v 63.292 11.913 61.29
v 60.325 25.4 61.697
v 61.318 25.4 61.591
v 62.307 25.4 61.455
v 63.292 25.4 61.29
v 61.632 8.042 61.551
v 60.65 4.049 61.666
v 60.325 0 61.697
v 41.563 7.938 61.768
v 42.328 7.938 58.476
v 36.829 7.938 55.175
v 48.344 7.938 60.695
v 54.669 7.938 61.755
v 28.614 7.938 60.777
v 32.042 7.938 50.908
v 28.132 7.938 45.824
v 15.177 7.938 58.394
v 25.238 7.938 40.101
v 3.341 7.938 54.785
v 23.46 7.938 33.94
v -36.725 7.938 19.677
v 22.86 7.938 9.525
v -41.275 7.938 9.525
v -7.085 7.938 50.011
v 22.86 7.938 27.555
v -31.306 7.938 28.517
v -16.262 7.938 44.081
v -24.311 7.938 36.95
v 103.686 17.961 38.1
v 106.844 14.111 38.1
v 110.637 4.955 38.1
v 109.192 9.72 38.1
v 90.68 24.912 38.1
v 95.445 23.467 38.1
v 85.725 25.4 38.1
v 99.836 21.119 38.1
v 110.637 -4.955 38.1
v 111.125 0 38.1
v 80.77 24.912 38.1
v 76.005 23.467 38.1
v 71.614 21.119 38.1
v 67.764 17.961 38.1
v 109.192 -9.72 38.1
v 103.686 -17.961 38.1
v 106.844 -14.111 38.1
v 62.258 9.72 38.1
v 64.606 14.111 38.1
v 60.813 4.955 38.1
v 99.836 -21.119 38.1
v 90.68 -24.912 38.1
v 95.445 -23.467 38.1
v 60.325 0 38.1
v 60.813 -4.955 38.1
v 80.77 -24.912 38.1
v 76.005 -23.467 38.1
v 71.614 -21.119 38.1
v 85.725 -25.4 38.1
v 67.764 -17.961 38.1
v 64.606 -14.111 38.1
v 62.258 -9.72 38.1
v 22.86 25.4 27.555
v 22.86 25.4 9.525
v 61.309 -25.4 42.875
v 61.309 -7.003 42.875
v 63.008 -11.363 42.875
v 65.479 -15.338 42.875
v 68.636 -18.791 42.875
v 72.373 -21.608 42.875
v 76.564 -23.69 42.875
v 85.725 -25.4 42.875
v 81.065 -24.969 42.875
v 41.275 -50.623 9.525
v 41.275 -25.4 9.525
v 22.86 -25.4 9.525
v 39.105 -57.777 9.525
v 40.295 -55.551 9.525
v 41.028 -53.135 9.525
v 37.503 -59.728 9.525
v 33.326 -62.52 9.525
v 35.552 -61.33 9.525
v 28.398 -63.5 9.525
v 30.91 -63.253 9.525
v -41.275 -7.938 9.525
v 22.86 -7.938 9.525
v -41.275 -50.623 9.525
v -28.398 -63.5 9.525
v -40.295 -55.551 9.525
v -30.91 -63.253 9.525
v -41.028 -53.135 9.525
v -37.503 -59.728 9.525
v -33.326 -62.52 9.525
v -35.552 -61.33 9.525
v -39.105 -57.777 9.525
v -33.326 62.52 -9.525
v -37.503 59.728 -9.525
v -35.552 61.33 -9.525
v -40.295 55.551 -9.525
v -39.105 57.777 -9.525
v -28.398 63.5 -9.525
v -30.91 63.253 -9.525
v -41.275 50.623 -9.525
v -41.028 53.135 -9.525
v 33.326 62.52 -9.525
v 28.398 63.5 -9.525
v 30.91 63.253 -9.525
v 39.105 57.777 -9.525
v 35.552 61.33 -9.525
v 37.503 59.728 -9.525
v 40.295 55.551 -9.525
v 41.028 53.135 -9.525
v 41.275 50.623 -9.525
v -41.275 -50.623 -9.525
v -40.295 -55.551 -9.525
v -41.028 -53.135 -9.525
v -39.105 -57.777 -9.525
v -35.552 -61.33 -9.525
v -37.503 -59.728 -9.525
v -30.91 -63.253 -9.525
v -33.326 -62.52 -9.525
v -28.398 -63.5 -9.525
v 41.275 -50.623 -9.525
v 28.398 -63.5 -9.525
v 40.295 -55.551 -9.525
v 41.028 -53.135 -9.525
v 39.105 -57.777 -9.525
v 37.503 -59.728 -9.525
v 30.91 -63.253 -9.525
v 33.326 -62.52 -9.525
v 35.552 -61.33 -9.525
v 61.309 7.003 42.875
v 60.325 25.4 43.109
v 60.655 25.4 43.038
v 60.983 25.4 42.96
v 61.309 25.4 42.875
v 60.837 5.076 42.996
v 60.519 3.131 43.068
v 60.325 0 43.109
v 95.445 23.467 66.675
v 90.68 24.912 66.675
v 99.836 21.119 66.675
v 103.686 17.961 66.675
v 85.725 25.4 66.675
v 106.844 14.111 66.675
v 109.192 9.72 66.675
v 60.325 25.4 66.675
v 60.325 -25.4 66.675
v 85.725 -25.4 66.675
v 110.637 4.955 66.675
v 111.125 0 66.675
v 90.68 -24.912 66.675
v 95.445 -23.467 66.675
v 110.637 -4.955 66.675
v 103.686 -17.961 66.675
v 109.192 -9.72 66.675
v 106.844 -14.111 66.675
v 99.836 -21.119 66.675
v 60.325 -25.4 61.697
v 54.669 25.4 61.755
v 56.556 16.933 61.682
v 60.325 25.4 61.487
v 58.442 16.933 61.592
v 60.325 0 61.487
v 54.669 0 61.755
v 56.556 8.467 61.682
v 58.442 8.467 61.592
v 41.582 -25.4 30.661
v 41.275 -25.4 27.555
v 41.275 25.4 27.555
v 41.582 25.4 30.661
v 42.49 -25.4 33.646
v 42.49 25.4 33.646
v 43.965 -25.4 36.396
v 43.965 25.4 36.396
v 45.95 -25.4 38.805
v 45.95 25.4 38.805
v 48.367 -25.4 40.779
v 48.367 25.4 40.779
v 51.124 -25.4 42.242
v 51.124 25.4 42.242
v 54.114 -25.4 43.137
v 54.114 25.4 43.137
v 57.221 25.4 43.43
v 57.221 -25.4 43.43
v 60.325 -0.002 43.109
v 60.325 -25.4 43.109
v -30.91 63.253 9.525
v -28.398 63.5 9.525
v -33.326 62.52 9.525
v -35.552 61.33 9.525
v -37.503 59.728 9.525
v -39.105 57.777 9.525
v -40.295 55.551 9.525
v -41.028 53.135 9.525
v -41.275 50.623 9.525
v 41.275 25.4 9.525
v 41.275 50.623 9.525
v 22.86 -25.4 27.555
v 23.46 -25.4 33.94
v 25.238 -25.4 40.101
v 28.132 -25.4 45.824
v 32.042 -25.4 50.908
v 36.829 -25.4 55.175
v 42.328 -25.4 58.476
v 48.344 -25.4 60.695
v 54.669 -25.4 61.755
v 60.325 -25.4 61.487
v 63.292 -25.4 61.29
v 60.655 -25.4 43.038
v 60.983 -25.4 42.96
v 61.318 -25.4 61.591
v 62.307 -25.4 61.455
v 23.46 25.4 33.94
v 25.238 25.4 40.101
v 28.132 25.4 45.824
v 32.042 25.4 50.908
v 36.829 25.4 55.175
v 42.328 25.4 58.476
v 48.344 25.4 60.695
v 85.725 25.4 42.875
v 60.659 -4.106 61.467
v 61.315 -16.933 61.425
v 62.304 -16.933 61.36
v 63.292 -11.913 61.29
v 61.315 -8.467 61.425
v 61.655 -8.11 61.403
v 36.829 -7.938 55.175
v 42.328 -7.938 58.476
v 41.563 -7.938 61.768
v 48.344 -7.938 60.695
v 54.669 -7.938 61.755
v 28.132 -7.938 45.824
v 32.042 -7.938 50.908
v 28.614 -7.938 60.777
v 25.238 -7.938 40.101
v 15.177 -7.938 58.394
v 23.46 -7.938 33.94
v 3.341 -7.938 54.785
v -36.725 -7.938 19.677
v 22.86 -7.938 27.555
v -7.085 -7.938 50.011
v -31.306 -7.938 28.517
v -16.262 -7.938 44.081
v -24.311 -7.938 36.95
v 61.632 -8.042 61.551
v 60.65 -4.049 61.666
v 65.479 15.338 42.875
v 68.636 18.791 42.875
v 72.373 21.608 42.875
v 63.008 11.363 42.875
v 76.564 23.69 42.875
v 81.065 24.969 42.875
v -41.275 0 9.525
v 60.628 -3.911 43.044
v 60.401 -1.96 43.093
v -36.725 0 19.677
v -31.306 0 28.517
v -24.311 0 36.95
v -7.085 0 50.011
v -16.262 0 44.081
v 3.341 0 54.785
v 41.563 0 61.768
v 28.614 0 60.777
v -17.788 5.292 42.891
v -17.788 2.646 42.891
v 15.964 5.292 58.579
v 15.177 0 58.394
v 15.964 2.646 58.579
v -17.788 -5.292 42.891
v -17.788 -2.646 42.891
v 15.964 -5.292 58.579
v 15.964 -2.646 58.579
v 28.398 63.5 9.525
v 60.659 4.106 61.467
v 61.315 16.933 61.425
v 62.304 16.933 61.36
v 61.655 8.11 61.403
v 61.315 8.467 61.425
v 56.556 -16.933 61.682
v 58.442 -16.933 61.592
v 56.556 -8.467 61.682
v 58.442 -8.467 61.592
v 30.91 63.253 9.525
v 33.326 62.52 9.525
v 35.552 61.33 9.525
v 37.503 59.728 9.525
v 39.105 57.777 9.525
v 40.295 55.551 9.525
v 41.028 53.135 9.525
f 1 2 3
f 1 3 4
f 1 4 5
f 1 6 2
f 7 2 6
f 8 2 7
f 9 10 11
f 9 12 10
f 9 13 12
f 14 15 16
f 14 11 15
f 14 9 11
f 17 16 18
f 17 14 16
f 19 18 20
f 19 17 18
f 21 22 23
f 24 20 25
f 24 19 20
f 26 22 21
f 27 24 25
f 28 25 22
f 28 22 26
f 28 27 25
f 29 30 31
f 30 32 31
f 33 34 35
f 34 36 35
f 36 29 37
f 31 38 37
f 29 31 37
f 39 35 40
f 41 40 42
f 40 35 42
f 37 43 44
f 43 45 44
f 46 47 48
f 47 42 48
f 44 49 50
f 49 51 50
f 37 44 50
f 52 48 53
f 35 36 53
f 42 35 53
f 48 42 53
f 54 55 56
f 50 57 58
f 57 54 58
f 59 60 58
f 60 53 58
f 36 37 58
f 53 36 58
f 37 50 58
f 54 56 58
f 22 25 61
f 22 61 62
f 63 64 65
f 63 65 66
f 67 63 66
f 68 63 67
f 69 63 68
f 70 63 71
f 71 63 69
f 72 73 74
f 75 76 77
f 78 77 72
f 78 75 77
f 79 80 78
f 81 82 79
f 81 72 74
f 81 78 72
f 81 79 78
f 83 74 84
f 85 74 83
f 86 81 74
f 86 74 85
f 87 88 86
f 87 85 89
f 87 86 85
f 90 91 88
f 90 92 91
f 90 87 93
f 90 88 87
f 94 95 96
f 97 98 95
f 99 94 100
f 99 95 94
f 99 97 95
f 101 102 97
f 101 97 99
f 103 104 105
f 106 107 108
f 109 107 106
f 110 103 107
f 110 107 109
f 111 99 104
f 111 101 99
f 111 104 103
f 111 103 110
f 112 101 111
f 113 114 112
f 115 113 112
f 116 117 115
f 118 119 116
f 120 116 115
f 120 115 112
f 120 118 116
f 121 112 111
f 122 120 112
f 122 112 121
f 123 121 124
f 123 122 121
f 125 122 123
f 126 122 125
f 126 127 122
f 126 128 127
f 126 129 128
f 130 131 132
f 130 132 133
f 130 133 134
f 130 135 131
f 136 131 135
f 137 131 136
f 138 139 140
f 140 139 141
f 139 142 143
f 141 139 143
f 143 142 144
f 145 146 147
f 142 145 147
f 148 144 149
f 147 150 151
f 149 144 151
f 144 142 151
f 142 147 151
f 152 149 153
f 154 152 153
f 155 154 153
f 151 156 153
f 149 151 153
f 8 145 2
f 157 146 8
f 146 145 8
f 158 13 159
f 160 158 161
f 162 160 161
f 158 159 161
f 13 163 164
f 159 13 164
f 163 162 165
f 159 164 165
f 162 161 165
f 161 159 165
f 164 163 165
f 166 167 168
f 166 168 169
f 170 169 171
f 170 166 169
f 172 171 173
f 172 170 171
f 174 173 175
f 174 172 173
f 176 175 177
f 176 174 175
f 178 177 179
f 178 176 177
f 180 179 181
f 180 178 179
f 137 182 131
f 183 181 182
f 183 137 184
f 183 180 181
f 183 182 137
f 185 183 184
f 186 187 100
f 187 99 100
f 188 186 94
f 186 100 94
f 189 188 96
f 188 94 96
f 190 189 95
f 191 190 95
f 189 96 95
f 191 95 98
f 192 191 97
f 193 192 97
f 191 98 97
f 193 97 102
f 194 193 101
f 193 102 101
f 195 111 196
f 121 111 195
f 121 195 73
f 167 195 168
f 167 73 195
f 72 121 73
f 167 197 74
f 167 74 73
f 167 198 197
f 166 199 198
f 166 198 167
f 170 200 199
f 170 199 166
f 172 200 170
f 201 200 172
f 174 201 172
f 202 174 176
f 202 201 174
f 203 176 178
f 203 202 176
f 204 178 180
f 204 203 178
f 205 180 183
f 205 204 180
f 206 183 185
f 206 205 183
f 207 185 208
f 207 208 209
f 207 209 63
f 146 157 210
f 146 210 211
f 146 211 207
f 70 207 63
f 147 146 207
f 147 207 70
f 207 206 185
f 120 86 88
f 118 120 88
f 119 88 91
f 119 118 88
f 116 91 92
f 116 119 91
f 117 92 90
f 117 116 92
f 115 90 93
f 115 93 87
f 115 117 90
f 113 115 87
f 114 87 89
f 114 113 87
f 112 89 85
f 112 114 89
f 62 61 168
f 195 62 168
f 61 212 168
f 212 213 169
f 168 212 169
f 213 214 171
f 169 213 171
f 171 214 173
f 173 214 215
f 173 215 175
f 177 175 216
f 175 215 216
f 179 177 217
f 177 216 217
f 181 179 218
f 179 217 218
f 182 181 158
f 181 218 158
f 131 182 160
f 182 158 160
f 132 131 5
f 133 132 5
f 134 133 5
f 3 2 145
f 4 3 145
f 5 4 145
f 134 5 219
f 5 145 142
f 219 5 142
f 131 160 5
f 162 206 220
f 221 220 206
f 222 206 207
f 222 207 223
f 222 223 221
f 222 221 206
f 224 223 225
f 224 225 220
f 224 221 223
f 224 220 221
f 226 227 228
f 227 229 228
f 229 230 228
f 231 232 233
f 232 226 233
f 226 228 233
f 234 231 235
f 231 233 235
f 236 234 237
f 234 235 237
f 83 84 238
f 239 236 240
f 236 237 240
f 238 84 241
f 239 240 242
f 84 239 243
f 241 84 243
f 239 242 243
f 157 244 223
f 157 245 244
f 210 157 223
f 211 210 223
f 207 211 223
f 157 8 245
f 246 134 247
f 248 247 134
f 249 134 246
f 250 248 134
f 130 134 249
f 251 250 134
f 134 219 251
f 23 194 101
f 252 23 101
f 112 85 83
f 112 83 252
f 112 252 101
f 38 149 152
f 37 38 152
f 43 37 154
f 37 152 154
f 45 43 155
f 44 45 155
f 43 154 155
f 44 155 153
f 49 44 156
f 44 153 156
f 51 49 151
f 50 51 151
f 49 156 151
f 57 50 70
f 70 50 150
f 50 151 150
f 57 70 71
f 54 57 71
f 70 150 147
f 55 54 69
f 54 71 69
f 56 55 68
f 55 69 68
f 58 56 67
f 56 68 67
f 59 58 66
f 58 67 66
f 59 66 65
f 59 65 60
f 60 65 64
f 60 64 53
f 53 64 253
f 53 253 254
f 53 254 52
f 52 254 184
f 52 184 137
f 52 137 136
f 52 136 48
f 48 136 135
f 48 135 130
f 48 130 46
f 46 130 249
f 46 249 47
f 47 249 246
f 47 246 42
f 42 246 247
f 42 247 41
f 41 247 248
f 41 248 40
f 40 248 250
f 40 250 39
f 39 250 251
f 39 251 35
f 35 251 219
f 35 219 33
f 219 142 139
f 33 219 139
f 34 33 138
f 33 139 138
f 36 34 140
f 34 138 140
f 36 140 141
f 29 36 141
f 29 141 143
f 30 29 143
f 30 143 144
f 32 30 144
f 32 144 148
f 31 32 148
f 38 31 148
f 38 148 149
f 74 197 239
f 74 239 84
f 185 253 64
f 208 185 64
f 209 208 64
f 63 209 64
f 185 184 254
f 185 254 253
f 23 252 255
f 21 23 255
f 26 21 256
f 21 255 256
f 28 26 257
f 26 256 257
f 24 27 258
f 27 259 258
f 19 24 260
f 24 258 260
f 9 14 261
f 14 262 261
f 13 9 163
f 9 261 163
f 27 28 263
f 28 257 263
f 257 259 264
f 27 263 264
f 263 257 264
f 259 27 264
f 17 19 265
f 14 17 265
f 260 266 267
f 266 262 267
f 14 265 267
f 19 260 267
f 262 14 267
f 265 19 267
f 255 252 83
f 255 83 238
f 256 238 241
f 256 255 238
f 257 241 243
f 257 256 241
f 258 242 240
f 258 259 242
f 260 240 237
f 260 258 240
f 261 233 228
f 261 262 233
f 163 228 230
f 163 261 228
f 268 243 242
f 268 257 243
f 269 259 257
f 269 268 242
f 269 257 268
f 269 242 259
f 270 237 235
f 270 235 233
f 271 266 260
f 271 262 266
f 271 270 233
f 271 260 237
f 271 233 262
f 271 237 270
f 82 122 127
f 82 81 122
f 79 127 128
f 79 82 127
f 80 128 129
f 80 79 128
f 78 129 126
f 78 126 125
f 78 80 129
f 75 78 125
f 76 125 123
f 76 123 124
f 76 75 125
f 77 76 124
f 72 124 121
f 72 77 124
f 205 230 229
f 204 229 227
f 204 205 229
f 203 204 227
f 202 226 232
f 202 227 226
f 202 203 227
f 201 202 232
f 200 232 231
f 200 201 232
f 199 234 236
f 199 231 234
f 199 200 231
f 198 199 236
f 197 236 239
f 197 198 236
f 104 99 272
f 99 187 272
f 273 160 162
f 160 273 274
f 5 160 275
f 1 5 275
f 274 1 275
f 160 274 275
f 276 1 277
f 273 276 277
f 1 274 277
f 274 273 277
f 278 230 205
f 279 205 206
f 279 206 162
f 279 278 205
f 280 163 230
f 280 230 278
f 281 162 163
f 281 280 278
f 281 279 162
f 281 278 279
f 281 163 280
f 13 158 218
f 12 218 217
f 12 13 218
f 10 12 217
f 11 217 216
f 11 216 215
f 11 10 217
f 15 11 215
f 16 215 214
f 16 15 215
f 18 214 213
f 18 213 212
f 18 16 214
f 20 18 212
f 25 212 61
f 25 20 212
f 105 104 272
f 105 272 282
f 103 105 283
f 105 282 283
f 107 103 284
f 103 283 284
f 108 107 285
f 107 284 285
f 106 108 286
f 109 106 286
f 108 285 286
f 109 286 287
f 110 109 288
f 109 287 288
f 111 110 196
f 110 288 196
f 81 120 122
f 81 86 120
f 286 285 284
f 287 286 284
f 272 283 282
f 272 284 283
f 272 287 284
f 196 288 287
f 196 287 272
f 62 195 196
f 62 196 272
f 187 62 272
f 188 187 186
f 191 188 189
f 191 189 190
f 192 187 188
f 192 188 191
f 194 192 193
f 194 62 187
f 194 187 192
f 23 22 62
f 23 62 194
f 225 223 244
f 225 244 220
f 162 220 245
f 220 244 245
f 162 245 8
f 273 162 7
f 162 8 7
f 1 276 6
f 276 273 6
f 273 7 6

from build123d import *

# Parameters (mm, degrees)
F1_DEPTH = 63.5
F2_DEPTH = 25.4
F3_DEPTH = 7.9375
F5_R     = 12.877415


with BuildPart() as f1:
    # F0 (on Front) → F1 (new body, symmetric)
    with BuildSketch(Plane.XZ):
        Polygon((22.86, 9.525), (-41.275, 9.525), (-41.275, -9.525), (41.275, -9.525), (41.275, 9.525), align=None)
    extrude(amount=F1_DEPTH, both=True)

    # F0 (on Front) → F2 (join, symmetric)
    with BuildSketch(Plane.XZ):
        with BuildLine():
            Line((22.86, 27.554785), (22.86, 9.525))
            Line((22.86, 9.525), (41.275, 9.525))
            Line((41.275, 9.525), (41.275, 27.554785))
            ThreePointArc((41.275, 27.554785), (47.109768, 39.851507), (60.325, 43.109045))
            Line((60.325, 43.109045), (60.325, 61.486875))
            add(Edge.make_bspline(
                [(54.669271, 61.754933), (56.556617, 61.689986), (58.442735, 61.599782), (60.325, 61.486875)],
                knots=[108.732471, 108.732471, 108.732471, 108.732471, 113.939403, 113.939403, 113.939403, 113.939403], degree=3))
            ThreePointArc((54.669271, 61.754933), (32.041552, 50.907942), (22.86, 27.554785))
        make_face()
        with BuildLine():
            Line((60.325, 66.675), (60.325, 61.697478))
            ThreePointArc((60.325, 61.697478), (61.813019, 61.526249), (63.29214, 61.2902))
            add(Edge.make_bspline(
                [(60.325, 61.486875), (61.31524, 61.427476), (62.304414, 61.361794), (63.29214, 61.2902)],
                knots=[113.939403, 113.939403, 113.939403, 113.939403, 116.678715, 116.678715, 116.678715, 116.678715], degree=3))
            Line((60.325, 61.486875), (60.325, 43.109045))
            ThreePointArc((60.325, 43.109045), (60.819058, 42.999967), (61.309388, 42.8752))
            Line((61.309388, 42.8752), (85.725, 42.8752))
            Line((85.725, 42.8752), (85.725, 66.675))
            Line((85.725, 66.675), (60.325, 66.675))
        make_face()
    extrude(amount=F2_DEPTH, both=True)

    # F0 (on Front) → F3 (join, symmetric)
    with BuildSketch(Plane.XZ):
        with BuildLine():
            add(Edge.make_bspline(
                [(-41.275, 9.525), (-24.690354, 53.453726), (15.257235, 63.111172), (54.669271, 61.754933)],
                knots=[0, 0, 0, 0, 108.732471, 108.732471, 108.732471, 108.732471], degree=3))
            Line((-41.275, 9.525), (22.86, 9.525))
            Line((22.86, 9.525), (22.86, 27.554785))
            ThreePointArc((22.86, 27.554785), (32.041552, 50.907942), (54.669271, 61.754933))
        make_face()
    extrude(amount=F3_DEPTH, both=True)

    # F0 (on Front) → F4 (revolve)
    with BuildSketch(Plane.XZ):
        Polygon((111.125, 66.675), (85.725, 66.675), (85.725, 42.8752), (85.725, 38.1), (111.125, 38.1), align=None)
    revolve(axis=Axis((85.725, 0, 52.3875), (0, 0, -1)))

    # F5
    f5_edges = [f1.edges().sort_by_distance(p)[0] for p in [
        (41.275, -63.5, 0),
        (-41.275, -63.5, 0),
        (-41.275, 63.5, 0),
        (41.275, 63.5, 0),
    ]]
    fillet(f5_edges, radius=F5_R)


solid = f1.part
